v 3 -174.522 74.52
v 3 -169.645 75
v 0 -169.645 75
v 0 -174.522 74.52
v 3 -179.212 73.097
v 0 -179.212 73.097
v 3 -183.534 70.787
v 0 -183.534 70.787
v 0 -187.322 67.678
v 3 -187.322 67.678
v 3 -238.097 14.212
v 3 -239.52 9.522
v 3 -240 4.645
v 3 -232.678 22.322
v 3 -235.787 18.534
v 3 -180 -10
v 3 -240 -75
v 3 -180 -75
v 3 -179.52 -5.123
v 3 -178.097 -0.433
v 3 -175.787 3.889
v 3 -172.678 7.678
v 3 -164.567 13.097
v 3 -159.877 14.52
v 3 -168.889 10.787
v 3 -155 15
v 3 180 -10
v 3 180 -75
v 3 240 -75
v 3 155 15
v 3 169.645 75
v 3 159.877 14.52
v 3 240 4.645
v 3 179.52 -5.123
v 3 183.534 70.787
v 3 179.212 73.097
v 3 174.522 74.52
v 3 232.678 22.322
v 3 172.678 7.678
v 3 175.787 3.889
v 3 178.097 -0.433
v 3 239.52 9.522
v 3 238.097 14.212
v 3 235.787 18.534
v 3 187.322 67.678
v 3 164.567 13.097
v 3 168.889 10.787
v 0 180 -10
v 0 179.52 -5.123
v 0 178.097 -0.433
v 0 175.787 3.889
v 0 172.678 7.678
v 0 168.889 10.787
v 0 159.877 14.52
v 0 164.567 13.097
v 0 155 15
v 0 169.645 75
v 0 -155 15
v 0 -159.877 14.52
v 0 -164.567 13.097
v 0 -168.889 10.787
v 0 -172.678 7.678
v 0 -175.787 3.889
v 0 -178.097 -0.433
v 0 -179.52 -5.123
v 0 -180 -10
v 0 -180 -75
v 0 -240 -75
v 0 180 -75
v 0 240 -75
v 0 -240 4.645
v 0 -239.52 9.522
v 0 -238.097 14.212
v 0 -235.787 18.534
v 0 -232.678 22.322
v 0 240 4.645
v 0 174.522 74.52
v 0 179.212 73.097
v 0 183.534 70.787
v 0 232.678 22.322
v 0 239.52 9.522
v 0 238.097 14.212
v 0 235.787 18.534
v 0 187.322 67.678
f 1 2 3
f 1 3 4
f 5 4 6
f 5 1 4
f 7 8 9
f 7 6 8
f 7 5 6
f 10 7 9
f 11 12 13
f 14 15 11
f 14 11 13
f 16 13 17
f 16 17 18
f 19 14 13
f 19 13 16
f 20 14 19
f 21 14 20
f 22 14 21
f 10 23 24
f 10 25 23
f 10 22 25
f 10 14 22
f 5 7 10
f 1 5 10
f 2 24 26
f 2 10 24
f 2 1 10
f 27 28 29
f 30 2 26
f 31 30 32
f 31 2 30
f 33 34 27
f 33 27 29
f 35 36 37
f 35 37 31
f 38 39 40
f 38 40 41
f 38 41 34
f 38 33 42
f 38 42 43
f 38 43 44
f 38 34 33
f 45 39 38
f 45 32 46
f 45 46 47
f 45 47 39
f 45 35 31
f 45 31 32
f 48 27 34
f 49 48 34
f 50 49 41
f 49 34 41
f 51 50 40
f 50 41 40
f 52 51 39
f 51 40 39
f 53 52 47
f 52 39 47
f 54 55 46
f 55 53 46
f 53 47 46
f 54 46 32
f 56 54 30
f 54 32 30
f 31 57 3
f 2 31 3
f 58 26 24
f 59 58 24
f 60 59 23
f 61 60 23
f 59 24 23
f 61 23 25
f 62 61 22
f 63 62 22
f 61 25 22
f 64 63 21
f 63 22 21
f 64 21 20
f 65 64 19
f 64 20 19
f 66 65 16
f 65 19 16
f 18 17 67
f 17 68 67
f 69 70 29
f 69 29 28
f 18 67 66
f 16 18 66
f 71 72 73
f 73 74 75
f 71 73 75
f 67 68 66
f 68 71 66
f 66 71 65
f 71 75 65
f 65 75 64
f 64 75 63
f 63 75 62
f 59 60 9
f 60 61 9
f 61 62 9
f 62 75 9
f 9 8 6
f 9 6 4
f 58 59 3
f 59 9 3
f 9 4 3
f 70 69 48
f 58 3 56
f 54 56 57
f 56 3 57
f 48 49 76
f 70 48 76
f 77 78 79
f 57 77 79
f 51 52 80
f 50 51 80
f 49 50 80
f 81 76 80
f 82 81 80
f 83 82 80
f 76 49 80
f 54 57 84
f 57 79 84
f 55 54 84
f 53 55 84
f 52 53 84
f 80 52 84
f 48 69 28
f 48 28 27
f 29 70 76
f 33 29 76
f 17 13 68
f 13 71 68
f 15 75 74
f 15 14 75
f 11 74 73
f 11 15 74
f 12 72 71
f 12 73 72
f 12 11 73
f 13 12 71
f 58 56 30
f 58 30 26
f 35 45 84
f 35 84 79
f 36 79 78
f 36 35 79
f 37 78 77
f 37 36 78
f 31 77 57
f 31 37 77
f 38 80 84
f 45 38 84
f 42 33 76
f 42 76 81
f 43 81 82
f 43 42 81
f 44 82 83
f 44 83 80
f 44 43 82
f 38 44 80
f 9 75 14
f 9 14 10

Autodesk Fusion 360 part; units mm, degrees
sketch "Sketch1" plane through (0, 0, 0) normal (1, 0, 0) x (0, 1, 0)
  line L0 (180, 75) -> (-180, 75)
  line L1 (-240, 15) -> (-240, -75)
  line L2 (240, -75) -> (240, 15)
  line L3 (-240, -75) -> (-180, -75)
  line L4 (-180, -75) -> (-180, 75)
  line L5 (-240, 15) -> (-240, -75)
  line L6 (240, -75) -> (180, -75)
  line L7 (180, -75) -> (180, 75)
  line L8 (240, 15) -> (240, -75)
  line L9 (-180, 75) -> (180, 75)
  line L10 (240, 15) -> (-240, 15)
  line L11 (-240, 15) -> (-180, 75)
  line L12 (240, 15) -> (180, 75)
  line L13 (-240, -75) -> (-180, -75)
  line L14 (180, -75) -> (240, -75)
  line L15 (194.2857, 60.7143) -> (48, 15) construction
  line L16 (-194.2857, 60.7143) -> (-48, 15) construction
  line L17 (180, -56.25) -> (240, -75) construction
  line L18 (0, 55) -> (5, 55)
  line L19 (5, 35) -> (0, 35)
  line L20 (5, 65) -> (10, 65)
  line L21 (10, 65) -> (10, 25)
  line L22 (10, 25) -> (5, 25)
  line L23 (0, 75) -> (0, 55)
  line L24 (0, 35) -> (0, 15)
  line L25 (5, 25) -> (5, 35)
  line L26 (5, 55) -> (5, 65)
  dimension "d1" = 480
  dimension "d3" = 60
  dimension "d5" = 60
extrude "Extrude1" add sketch "Sketch1" along normal blind 3
sketch "Sketch2" plane through (0, 0, 0) normal (-1, 0, 0) x (0, -1, 0)
  line L0 (-180, -75) -> (-180, 15)
  line L1 (-180, 15) -> (180, 15)
  line L2 (180, 15) -> (180, -75)
  line L3 (180, -75) -> (240, -75)
  line L4 (240, -75) -> (240, 15)
  line L5 (240, 15) -> (180, 75)
  line L6 (180, 75) -> (-180, 75)
  line L7 (-180, 75) -> (-240, 15)
  line L8 (-240, 15) -> (-240, -75)
  line L9 (-240, -75) -> (-180, -75)
  line L10 (0, 55) -> (5, 55)
  line L11 (5, 35) -> (0, 35)
  line L12 (5, 65) -> (10, 65)
  line L13 (10, 65) -> (10, 25)
  line L14 (10, 25) -> (5, 25)
  line L15 (5, 25) -> (5, 35)
  line L16 (5, 55) -> (5, 65)
  line L17 (0, 55) -> (0, 75)
  line L18 (0, 35) -> (0, 15)
fillet "Fillet1" radius 25 2 edges at (1.5, -180, 15) (1.5, 180, 15)
fillet "Fillet2" radius 25 4 edges at (1.5, -240, 15) (1.5, -180, 75) (1.5, 180, 75) (1.5, 240, 15)
sketch "Sketch3" plane through (3, 0, 0) normal (1, 0, 0) x (0, 1, 0)
  arc A0 (240, 4.6447) -> (232.6777, 22.3223) centre (215, 4.6447) ccw
  line L0 (232.6777, 22.3223) -> (187.3223, 67.6777)
  arc A1 (187.3223, 67.6777) -> (169.6447, 75) centre (169.6447, 50) ccw
  line L1 (169.6447, 75) -> (-169.6447, 75)
  arc A2 (-169.6447, 75) -> (-187.3223, 67.6777) centre (-169.6447, 50) ccw
  line L2 (-187.3223, 67.6777) -> (-232.6777, 22.3223)
  arc A3 (-232.6777, 22.3223) -> (-240, 4.6447) centre (-215, 4.6447) ccw
  line L3 (-240, 4.6447) -> (-240, -75)
  line L4 (-240, -75) -> (-180, -75)
  line L5 (-180, -75) -> (-180, -10)
  arc A4 (-155, 15) -> (-180, -10) centre (-155, -10) ccw
  line L6 (-155, 15) -> (155, 15)
  arc A5 (180, -10) -> (155, 15) centre (155, -10) ccw
  line L7 (180, -10) -> (180, -75)
  line L8 (180, -75) -> (240, -75)
  line L9 (240, -75) -> (240, 4.6447)
